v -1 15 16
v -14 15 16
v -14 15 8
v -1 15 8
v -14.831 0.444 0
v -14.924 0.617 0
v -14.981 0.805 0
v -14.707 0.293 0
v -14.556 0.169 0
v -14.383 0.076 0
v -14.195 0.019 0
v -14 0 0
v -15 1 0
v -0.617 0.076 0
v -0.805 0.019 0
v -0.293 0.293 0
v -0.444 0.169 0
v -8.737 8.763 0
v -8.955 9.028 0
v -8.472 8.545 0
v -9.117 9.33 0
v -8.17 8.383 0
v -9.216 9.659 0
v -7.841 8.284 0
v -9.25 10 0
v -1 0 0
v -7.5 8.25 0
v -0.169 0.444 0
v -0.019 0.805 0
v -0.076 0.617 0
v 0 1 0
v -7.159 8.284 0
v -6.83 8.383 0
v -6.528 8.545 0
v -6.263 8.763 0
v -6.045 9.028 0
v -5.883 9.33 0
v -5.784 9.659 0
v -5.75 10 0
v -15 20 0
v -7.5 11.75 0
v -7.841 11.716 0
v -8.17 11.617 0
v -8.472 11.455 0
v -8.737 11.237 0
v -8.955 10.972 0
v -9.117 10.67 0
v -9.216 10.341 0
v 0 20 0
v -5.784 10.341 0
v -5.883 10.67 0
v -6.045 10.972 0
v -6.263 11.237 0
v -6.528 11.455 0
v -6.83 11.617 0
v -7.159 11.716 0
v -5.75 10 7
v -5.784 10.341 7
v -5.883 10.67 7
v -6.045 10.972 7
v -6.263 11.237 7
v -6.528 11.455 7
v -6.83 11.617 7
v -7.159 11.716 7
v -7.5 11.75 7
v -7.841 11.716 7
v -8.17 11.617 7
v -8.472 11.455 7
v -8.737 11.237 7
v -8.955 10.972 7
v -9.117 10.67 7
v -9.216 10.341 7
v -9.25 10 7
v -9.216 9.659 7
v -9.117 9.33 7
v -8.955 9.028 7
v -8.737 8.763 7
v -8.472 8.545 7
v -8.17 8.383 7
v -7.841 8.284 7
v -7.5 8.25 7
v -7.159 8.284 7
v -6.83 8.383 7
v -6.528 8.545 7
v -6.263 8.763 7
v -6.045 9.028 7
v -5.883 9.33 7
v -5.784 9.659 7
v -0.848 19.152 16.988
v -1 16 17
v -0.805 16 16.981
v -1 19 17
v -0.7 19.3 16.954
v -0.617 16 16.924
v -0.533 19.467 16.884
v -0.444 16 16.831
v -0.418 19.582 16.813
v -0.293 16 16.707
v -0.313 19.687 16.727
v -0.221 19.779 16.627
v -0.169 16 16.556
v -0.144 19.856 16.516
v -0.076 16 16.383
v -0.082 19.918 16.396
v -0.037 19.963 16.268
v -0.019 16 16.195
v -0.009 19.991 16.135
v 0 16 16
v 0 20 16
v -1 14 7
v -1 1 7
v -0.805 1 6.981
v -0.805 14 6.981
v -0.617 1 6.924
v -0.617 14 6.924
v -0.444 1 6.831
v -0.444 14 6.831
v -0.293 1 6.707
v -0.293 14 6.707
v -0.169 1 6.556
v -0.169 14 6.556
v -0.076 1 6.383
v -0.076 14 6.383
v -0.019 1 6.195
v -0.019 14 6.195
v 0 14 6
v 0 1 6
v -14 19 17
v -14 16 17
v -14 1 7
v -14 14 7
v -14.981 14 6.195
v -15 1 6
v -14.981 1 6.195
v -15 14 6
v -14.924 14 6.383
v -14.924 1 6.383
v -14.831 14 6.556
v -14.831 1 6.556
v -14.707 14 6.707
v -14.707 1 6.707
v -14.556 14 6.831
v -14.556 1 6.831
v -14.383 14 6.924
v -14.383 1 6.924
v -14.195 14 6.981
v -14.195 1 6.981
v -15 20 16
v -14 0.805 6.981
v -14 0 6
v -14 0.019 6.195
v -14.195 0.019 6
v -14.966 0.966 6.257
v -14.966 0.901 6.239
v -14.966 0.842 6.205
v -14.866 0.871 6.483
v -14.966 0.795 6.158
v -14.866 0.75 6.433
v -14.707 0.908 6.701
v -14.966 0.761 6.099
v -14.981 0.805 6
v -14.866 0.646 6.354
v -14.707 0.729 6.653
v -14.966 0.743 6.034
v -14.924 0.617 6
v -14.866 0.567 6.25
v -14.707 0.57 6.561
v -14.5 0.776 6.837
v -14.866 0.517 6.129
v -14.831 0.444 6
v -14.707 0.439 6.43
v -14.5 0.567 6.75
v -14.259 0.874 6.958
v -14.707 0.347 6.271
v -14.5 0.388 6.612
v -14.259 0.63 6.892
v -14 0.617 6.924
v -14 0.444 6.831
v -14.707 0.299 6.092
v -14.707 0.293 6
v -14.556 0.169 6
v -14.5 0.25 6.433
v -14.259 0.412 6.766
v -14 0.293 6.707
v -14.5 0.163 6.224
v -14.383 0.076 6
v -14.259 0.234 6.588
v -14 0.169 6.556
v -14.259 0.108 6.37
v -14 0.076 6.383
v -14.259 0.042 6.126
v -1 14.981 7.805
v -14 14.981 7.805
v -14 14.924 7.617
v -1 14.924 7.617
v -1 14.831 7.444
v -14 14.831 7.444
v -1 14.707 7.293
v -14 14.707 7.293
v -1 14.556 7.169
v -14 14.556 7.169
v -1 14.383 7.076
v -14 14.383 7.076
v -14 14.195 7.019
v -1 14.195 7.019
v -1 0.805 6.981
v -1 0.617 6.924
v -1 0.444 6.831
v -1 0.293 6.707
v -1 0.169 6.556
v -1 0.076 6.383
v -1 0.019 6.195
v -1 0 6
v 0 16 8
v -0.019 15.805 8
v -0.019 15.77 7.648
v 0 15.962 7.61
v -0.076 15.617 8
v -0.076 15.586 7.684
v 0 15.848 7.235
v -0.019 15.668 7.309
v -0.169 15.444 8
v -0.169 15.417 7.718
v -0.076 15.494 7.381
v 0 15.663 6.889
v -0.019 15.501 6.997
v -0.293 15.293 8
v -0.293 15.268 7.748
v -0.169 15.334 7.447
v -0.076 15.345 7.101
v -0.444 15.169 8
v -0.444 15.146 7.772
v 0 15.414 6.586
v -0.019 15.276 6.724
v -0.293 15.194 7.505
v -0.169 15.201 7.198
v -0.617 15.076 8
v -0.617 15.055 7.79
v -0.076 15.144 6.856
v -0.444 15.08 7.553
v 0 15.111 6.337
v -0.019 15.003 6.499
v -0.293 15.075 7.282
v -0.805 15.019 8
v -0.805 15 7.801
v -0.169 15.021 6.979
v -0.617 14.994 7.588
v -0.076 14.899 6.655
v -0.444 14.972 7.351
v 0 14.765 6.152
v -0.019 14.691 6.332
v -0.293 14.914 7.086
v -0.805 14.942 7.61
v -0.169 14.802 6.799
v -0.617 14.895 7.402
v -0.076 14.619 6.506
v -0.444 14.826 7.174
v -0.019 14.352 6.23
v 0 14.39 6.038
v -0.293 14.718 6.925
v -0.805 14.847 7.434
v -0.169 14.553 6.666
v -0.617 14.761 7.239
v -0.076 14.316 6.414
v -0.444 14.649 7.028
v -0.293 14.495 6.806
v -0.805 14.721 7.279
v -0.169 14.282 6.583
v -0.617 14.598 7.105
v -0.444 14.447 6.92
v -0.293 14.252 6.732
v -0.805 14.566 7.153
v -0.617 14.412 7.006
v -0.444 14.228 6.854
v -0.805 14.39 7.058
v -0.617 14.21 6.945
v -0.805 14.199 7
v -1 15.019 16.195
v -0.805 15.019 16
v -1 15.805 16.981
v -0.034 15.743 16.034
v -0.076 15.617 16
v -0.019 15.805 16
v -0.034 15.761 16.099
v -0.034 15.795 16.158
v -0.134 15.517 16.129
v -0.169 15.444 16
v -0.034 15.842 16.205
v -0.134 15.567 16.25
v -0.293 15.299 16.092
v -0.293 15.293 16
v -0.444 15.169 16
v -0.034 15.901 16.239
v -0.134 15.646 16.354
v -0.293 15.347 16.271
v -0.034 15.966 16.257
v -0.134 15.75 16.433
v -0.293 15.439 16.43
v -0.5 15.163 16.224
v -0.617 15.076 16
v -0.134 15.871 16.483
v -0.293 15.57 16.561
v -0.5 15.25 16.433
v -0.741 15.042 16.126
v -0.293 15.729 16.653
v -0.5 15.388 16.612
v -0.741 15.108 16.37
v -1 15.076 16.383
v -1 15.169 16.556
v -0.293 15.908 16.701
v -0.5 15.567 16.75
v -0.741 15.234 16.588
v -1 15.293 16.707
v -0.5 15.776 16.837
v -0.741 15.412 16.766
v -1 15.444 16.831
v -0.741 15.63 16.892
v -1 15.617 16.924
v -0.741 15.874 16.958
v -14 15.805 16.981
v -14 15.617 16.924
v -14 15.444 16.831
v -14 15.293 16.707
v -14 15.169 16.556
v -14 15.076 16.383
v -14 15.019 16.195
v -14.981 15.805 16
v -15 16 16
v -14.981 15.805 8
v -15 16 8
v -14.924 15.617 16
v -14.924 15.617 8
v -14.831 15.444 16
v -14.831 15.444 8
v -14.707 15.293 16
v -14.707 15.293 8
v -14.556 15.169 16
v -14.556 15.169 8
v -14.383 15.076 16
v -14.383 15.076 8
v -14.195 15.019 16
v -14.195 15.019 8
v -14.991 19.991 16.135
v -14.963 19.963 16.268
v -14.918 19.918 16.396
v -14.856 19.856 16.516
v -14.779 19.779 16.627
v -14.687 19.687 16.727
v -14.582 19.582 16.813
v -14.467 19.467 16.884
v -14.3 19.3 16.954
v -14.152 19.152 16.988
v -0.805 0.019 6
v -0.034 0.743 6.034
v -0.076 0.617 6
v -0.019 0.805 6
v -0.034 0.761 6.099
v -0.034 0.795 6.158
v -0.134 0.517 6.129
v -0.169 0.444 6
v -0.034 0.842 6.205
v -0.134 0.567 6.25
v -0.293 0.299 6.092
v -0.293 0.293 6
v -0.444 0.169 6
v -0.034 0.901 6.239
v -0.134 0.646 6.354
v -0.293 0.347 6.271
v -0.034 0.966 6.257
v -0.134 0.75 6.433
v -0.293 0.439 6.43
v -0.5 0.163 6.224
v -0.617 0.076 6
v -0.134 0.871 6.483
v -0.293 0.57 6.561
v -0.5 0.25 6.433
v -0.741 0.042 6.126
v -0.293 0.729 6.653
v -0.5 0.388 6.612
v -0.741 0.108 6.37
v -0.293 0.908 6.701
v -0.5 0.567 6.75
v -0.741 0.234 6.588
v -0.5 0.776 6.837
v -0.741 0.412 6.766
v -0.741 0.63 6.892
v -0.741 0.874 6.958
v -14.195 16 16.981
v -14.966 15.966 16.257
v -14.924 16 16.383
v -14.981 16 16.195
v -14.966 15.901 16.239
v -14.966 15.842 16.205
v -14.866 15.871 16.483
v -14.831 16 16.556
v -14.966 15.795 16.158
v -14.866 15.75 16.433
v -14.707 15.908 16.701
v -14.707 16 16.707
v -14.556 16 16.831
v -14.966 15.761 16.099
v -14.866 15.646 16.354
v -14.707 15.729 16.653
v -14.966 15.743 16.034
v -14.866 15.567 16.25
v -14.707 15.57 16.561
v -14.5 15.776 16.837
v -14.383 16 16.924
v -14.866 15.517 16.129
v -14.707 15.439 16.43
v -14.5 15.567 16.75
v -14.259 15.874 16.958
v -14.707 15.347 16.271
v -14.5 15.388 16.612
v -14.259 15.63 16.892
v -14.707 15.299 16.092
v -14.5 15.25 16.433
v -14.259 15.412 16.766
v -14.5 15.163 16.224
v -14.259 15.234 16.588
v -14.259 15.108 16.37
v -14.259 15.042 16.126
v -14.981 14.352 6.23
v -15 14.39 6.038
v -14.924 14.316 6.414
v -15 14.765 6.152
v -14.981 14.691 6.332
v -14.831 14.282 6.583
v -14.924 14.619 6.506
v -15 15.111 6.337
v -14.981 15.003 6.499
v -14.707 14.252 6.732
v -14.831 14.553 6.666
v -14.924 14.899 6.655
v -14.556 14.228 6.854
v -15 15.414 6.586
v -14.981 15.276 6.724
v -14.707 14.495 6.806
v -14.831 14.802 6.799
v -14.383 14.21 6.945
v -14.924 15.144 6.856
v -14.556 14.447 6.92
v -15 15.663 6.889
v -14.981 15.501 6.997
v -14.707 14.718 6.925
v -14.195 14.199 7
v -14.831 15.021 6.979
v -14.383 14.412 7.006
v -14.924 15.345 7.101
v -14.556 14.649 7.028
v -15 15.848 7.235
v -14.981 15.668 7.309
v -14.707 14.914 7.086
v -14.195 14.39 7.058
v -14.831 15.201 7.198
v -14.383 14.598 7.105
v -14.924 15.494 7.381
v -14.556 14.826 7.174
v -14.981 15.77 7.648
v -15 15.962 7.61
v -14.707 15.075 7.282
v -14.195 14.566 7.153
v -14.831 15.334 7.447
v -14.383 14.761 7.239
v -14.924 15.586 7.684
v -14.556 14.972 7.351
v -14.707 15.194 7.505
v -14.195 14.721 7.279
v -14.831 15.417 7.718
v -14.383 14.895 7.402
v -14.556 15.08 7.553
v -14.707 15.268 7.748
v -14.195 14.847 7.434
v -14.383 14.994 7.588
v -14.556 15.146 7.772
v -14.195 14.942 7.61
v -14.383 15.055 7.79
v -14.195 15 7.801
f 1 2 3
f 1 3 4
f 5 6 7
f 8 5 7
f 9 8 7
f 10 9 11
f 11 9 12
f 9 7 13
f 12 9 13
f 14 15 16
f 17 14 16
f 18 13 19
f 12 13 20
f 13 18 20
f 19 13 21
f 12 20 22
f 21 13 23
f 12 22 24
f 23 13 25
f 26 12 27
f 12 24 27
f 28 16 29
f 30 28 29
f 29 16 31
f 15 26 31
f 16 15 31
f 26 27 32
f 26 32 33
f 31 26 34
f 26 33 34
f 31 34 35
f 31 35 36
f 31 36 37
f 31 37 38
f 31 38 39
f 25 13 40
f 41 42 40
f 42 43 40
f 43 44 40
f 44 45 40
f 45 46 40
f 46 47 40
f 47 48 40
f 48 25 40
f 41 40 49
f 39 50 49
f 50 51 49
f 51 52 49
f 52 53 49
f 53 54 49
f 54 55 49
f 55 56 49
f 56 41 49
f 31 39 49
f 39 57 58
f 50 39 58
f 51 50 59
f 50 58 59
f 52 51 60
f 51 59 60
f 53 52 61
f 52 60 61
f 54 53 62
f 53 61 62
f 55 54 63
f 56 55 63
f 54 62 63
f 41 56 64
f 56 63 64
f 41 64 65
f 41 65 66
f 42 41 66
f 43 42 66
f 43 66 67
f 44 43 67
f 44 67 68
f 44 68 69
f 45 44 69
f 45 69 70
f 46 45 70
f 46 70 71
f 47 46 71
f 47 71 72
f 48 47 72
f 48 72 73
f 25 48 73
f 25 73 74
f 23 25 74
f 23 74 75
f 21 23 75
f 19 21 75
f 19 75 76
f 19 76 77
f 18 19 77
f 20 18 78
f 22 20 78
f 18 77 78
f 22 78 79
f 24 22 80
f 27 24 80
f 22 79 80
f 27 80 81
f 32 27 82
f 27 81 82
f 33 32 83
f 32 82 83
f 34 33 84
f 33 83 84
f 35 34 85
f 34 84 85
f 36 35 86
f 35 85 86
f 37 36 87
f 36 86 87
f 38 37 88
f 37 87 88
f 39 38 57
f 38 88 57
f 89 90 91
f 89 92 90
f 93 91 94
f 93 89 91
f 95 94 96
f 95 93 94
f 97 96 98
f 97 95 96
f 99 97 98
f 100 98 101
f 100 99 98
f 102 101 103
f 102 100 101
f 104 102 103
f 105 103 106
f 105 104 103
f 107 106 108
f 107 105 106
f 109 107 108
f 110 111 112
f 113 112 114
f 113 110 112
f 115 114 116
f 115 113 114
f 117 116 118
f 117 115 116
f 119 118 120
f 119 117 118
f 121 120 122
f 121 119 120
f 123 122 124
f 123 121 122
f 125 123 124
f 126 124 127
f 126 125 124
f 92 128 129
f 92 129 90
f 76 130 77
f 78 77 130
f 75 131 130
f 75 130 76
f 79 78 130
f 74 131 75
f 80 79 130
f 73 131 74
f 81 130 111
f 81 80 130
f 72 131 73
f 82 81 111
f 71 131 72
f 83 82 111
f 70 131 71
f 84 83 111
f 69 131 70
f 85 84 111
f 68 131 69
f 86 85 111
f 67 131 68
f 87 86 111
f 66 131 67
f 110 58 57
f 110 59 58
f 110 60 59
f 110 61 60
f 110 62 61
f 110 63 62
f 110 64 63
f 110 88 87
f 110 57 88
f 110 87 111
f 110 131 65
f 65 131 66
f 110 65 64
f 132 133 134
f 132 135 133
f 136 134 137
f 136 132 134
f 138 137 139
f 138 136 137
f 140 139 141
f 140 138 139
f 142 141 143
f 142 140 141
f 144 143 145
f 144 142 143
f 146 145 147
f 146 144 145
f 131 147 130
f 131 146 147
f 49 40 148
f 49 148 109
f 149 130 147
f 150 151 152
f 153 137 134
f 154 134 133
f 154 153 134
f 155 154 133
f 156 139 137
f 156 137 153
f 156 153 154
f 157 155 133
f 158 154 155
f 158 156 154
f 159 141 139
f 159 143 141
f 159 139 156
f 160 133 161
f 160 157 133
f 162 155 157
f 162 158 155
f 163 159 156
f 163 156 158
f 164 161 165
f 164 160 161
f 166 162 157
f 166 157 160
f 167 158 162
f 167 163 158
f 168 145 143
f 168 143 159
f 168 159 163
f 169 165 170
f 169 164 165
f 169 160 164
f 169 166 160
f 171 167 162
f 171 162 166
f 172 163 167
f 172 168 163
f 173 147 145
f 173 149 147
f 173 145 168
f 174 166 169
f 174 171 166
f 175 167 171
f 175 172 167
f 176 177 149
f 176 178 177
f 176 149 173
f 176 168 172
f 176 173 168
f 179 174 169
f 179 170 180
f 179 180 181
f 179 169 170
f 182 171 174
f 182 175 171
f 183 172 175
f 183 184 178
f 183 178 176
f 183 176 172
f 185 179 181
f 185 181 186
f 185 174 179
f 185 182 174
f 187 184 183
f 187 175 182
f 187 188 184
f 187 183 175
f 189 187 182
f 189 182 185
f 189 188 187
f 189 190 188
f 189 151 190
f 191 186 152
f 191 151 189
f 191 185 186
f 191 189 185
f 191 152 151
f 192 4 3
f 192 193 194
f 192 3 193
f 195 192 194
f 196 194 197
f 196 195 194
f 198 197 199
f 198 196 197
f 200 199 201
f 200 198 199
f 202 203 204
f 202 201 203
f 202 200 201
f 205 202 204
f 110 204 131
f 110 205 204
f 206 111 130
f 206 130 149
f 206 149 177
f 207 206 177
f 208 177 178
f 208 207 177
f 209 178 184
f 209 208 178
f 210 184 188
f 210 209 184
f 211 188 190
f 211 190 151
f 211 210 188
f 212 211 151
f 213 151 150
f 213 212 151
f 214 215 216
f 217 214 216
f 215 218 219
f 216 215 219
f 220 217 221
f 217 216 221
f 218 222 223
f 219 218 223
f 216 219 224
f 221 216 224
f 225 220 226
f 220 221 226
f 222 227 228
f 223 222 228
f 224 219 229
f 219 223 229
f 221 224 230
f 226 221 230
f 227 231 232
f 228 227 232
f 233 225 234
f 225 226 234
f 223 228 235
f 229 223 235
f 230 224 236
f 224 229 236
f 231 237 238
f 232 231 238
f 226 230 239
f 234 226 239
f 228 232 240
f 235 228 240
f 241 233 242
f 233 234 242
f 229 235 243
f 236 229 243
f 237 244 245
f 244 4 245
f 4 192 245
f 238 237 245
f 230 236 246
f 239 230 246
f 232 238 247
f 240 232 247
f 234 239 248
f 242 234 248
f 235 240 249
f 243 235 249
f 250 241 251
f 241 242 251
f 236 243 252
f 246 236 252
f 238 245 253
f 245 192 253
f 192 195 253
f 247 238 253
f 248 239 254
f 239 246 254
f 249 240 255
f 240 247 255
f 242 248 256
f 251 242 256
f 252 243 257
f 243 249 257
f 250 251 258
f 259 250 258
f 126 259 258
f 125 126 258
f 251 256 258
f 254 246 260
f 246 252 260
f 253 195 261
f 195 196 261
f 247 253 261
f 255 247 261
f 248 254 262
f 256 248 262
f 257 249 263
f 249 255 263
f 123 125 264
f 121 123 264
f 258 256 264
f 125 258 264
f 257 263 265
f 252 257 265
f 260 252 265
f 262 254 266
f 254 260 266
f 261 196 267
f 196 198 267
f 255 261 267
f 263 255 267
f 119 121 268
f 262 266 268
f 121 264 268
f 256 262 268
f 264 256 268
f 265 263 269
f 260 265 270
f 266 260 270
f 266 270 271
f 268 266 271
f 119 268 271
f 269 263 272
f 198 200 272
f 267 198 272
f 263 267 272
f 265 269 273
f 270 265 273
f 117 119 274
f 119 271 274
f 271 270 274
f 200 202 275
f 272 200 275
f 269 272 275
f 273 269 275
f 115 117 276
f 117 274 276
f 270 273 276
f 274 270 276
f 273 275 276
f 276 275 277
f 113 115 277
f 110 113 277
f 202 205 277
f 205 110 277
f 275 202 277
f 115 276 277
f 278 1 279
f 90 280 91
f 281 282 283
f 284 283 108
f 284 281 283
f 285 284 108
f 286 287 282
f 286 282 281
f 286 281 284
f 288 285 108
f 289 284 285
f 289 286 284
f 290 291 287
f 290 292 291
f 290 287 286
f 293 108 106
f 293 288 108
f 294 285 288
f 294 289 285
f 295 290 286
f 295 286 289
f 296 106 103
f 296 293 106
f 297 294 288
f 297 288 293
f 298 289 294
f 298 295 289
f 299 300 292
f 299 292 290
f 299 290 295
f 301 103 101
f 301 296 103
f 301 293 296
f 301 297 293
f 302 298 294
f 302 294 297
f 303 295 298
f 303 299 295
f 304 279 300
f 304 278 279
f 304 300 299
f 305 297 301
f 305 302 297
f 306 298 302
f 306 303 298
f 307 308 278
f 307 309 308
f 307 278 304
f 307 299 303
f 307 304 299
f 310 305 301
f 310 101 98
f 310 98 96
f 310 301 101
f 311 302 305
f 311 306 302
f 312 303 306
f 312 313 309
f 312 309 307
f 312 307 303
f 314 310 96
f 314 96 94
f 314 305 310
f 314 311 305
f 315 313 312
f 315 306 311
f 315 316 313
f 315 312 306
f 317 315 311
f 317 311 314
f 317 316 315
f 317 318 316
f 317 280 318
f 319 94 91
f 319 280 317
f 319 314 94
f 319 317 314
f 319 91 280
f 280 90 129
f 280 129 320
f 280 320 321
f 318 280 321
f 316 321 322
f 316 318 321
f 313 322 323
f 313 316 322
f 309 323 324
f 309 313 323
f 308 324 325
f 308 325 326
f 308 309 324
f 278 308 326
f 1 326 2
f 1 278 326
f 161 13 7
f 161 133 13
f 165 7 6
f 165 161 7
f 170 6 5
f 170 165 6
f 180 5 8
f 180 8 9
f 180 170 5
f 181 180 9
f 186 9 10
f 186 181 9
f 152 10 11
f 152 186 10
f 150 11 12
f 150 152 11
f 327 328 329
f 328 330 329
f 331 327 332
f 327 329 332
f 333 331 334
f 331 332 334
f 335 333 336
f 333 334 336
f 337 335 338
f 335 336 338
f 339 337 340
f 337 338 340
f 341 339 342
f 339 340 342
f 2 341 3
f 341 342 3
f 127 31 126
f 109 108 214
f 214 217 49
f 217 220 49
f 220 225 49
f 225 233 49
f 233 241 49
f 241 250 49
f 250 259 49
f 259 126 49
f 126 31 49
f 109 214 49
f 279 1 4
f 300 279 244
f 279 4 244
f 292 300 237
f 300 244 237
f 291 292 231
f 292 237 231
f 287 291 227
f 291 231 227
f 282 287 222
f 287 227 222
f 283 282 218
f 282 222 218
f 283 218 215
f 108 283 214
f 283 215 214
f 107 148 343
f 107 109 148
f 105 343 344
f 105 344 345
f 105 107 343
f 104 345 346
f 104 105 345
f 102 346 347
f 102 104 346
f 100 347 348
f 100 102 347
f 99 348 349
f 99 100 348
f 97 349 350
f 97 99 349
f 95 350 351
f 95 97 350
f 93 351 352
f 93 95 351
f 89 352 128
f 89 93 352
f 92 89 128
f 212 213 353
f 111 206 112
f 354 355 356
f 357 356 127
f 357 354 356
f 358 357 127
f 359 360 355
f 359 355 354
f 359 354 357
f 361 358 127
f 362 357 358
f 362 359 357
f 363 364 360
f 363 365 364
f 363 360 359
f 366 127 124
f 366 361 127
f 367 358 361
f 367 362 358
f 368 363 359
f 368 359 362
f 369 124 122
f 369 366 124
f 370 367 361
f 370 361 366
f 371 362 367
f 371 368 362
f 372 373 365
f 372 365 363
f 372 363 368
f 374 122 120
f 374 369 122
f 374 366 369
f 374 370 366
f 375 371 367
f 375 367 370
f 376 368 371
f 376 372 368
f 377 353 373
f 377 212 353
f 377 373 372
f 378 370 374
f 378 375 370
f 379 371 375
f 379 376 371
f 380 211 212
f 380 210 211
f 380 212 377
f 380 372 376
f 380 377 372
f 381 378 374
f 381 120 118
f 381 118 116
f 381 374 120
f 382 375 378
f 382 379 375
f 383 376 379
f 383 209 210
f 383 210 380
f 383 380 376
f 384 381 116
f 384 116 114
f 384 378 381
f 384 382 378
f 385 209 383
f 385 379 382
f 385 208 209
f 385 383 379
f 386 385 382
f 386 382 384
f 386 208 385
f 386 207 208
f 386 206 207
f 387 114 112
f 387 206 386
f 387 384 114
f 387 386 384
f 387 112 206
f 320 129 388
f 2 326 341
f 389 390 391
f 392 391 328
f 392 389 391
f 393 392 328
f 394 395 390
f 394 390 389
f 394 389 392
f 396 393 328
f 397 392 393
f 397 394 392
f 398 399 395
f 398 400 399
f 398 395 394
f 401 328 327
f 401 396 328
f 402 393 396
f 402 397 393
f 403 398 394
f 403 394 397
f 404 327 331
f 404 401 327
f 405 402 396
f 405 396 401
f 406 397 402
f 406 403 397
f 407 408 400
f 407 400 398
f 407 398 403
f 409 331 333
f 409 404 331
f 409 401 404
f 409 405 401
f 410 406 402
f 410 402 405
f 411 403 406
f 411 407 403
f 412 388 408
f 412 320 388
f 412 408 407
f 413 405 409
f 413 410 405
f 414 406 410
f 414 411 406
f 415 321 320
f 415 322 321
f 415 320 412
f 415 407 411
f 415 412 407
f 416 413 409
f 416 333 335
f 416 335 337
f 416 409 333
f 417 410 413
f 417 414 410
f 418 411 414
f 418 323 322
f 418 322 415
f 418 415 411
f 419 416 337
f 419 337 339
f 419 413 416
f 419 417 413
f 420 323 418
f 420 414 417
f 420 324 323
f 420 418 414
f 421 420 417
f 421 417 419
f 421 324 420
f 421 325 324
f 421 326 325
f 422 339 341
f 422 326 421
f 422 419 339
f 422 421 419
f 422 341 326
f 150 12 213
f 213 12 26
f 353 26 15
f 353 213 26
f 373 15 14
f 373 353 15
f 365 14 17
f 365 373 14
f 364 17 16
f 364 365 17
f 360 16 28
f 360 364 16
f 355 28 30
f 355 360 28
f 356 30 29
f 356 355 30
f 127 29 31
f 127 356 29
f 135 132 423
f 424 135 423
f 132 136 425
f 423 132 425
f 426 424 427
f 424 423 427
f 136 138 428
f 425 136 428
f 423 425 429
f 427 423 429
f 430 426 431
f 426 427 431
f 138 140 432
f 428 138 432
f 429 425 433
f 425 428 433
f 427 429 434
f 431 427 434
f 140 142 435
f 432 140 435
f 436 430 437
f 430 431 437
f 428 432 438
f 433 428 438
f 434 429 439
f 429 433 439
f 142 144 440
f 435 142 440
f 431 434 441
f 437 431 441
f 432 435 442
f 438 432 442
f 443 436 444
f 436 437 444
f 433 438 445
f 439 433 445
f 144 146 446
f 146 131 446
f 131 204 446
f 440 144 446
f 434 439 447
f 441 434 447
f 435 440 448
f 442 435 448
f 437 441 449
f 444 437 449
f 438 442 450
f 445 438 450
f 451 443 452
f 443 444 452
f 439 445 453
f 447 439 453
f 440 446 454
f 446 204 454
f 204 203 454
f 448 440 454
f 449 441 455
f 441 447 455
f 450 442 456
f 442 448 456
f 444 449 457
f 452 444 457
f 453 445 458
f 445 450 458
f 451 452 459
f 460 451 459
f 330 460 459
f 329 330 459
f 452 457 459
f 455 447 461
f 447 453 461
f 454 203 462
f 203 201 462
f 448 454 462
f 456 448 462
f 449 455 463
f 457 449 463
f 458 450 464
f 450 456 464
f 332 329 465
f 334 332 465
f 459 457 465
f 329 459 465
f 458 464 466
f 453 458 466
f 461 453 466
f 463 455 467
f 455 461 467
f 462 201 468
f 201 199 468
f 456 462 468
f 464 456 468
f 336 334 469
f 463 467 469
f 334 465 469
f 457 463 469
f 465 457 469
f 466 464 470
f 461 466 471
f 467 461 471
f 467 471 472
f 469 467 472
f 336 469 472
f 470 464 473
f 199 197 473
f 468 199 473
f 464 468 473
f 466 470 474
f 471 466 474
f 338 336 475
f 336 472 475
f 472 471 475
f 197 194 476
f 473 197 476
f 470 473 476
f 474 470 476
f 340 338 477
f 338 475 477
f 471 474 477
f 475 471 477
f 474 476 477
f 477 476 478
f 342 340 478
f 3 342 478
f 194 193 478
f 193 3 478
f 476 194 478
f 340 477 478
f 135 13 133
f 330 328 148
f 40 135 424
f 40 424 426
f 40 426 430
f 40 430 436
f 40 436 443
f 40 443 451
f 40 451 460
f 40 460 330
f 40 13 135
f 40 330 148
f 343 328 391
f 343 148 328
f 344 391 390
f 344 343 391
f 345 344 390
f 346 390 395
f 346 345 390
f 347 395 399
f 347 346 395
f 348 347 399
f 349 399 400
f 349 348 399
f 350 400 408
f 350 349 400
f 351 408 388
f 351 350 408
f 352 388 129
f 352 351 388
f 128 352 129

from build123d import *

# Parameters (mm, degrees)
F0_W     = 15
F0_H     = 20
F1_DEPTH = 17
F2_R     = 1.75
F3_DEPTH = 17.001
F2_W     = 15
F2_H     = 15
F4_DEPTH = 10
F5_R     = 1


with BuildPart() as f1:
    # F0 (on Top) → F1 (new body)
    with BuildSketch(Plane.XY):
        with Locations((-7.5, 10)):
            Rectangle(F0_W, F0_H)
    extrude(amount=F1_DEPTH)

    # F2 (on face) → F3 (cut, through all)
    with BuildSketch(Plane.XY.offset(17)):
        with Locations((-7.5, 10)):
            Circle(F2_R)
    extrude(amount=-F3_DEPTH, mode=Mode.SUBTRACT)

    # F2 (on face) → F4 (cut)
    with BuildSketch(Plane.XY.offset(17)):
        with Locations((-7.5, 7.5)):
            Rectangle(F2_W, F2_H)
        with Locations((-7.5, 10)):
            Circle(F2_R, mode=Mode.SUBTRACT)
    extrude(amount=-F4_DEPTH, mode=Mode.SUBTRACT)

    # F5
    f5_edges = [f1.edges().sort_by_distance(p)[0] for p in [
        (-7.5, 20, 17),
        (-7.5, 15, 17),
        (-7.5, 15, 7),
        (-7.5, 0, 7),
        (-15, 7.5, 7),
        (-15, 0, 3.5),
        (0, 15, 12),
        (0, 0, 3.5),
        (0, 17.5, 17),
        (-15, 17.5, 17),
        (0, 7.5, 7),
        (-15, 15, 12),
    ]]
    fillet(f5_edges, radius=F5_R)


solid = f1.part
